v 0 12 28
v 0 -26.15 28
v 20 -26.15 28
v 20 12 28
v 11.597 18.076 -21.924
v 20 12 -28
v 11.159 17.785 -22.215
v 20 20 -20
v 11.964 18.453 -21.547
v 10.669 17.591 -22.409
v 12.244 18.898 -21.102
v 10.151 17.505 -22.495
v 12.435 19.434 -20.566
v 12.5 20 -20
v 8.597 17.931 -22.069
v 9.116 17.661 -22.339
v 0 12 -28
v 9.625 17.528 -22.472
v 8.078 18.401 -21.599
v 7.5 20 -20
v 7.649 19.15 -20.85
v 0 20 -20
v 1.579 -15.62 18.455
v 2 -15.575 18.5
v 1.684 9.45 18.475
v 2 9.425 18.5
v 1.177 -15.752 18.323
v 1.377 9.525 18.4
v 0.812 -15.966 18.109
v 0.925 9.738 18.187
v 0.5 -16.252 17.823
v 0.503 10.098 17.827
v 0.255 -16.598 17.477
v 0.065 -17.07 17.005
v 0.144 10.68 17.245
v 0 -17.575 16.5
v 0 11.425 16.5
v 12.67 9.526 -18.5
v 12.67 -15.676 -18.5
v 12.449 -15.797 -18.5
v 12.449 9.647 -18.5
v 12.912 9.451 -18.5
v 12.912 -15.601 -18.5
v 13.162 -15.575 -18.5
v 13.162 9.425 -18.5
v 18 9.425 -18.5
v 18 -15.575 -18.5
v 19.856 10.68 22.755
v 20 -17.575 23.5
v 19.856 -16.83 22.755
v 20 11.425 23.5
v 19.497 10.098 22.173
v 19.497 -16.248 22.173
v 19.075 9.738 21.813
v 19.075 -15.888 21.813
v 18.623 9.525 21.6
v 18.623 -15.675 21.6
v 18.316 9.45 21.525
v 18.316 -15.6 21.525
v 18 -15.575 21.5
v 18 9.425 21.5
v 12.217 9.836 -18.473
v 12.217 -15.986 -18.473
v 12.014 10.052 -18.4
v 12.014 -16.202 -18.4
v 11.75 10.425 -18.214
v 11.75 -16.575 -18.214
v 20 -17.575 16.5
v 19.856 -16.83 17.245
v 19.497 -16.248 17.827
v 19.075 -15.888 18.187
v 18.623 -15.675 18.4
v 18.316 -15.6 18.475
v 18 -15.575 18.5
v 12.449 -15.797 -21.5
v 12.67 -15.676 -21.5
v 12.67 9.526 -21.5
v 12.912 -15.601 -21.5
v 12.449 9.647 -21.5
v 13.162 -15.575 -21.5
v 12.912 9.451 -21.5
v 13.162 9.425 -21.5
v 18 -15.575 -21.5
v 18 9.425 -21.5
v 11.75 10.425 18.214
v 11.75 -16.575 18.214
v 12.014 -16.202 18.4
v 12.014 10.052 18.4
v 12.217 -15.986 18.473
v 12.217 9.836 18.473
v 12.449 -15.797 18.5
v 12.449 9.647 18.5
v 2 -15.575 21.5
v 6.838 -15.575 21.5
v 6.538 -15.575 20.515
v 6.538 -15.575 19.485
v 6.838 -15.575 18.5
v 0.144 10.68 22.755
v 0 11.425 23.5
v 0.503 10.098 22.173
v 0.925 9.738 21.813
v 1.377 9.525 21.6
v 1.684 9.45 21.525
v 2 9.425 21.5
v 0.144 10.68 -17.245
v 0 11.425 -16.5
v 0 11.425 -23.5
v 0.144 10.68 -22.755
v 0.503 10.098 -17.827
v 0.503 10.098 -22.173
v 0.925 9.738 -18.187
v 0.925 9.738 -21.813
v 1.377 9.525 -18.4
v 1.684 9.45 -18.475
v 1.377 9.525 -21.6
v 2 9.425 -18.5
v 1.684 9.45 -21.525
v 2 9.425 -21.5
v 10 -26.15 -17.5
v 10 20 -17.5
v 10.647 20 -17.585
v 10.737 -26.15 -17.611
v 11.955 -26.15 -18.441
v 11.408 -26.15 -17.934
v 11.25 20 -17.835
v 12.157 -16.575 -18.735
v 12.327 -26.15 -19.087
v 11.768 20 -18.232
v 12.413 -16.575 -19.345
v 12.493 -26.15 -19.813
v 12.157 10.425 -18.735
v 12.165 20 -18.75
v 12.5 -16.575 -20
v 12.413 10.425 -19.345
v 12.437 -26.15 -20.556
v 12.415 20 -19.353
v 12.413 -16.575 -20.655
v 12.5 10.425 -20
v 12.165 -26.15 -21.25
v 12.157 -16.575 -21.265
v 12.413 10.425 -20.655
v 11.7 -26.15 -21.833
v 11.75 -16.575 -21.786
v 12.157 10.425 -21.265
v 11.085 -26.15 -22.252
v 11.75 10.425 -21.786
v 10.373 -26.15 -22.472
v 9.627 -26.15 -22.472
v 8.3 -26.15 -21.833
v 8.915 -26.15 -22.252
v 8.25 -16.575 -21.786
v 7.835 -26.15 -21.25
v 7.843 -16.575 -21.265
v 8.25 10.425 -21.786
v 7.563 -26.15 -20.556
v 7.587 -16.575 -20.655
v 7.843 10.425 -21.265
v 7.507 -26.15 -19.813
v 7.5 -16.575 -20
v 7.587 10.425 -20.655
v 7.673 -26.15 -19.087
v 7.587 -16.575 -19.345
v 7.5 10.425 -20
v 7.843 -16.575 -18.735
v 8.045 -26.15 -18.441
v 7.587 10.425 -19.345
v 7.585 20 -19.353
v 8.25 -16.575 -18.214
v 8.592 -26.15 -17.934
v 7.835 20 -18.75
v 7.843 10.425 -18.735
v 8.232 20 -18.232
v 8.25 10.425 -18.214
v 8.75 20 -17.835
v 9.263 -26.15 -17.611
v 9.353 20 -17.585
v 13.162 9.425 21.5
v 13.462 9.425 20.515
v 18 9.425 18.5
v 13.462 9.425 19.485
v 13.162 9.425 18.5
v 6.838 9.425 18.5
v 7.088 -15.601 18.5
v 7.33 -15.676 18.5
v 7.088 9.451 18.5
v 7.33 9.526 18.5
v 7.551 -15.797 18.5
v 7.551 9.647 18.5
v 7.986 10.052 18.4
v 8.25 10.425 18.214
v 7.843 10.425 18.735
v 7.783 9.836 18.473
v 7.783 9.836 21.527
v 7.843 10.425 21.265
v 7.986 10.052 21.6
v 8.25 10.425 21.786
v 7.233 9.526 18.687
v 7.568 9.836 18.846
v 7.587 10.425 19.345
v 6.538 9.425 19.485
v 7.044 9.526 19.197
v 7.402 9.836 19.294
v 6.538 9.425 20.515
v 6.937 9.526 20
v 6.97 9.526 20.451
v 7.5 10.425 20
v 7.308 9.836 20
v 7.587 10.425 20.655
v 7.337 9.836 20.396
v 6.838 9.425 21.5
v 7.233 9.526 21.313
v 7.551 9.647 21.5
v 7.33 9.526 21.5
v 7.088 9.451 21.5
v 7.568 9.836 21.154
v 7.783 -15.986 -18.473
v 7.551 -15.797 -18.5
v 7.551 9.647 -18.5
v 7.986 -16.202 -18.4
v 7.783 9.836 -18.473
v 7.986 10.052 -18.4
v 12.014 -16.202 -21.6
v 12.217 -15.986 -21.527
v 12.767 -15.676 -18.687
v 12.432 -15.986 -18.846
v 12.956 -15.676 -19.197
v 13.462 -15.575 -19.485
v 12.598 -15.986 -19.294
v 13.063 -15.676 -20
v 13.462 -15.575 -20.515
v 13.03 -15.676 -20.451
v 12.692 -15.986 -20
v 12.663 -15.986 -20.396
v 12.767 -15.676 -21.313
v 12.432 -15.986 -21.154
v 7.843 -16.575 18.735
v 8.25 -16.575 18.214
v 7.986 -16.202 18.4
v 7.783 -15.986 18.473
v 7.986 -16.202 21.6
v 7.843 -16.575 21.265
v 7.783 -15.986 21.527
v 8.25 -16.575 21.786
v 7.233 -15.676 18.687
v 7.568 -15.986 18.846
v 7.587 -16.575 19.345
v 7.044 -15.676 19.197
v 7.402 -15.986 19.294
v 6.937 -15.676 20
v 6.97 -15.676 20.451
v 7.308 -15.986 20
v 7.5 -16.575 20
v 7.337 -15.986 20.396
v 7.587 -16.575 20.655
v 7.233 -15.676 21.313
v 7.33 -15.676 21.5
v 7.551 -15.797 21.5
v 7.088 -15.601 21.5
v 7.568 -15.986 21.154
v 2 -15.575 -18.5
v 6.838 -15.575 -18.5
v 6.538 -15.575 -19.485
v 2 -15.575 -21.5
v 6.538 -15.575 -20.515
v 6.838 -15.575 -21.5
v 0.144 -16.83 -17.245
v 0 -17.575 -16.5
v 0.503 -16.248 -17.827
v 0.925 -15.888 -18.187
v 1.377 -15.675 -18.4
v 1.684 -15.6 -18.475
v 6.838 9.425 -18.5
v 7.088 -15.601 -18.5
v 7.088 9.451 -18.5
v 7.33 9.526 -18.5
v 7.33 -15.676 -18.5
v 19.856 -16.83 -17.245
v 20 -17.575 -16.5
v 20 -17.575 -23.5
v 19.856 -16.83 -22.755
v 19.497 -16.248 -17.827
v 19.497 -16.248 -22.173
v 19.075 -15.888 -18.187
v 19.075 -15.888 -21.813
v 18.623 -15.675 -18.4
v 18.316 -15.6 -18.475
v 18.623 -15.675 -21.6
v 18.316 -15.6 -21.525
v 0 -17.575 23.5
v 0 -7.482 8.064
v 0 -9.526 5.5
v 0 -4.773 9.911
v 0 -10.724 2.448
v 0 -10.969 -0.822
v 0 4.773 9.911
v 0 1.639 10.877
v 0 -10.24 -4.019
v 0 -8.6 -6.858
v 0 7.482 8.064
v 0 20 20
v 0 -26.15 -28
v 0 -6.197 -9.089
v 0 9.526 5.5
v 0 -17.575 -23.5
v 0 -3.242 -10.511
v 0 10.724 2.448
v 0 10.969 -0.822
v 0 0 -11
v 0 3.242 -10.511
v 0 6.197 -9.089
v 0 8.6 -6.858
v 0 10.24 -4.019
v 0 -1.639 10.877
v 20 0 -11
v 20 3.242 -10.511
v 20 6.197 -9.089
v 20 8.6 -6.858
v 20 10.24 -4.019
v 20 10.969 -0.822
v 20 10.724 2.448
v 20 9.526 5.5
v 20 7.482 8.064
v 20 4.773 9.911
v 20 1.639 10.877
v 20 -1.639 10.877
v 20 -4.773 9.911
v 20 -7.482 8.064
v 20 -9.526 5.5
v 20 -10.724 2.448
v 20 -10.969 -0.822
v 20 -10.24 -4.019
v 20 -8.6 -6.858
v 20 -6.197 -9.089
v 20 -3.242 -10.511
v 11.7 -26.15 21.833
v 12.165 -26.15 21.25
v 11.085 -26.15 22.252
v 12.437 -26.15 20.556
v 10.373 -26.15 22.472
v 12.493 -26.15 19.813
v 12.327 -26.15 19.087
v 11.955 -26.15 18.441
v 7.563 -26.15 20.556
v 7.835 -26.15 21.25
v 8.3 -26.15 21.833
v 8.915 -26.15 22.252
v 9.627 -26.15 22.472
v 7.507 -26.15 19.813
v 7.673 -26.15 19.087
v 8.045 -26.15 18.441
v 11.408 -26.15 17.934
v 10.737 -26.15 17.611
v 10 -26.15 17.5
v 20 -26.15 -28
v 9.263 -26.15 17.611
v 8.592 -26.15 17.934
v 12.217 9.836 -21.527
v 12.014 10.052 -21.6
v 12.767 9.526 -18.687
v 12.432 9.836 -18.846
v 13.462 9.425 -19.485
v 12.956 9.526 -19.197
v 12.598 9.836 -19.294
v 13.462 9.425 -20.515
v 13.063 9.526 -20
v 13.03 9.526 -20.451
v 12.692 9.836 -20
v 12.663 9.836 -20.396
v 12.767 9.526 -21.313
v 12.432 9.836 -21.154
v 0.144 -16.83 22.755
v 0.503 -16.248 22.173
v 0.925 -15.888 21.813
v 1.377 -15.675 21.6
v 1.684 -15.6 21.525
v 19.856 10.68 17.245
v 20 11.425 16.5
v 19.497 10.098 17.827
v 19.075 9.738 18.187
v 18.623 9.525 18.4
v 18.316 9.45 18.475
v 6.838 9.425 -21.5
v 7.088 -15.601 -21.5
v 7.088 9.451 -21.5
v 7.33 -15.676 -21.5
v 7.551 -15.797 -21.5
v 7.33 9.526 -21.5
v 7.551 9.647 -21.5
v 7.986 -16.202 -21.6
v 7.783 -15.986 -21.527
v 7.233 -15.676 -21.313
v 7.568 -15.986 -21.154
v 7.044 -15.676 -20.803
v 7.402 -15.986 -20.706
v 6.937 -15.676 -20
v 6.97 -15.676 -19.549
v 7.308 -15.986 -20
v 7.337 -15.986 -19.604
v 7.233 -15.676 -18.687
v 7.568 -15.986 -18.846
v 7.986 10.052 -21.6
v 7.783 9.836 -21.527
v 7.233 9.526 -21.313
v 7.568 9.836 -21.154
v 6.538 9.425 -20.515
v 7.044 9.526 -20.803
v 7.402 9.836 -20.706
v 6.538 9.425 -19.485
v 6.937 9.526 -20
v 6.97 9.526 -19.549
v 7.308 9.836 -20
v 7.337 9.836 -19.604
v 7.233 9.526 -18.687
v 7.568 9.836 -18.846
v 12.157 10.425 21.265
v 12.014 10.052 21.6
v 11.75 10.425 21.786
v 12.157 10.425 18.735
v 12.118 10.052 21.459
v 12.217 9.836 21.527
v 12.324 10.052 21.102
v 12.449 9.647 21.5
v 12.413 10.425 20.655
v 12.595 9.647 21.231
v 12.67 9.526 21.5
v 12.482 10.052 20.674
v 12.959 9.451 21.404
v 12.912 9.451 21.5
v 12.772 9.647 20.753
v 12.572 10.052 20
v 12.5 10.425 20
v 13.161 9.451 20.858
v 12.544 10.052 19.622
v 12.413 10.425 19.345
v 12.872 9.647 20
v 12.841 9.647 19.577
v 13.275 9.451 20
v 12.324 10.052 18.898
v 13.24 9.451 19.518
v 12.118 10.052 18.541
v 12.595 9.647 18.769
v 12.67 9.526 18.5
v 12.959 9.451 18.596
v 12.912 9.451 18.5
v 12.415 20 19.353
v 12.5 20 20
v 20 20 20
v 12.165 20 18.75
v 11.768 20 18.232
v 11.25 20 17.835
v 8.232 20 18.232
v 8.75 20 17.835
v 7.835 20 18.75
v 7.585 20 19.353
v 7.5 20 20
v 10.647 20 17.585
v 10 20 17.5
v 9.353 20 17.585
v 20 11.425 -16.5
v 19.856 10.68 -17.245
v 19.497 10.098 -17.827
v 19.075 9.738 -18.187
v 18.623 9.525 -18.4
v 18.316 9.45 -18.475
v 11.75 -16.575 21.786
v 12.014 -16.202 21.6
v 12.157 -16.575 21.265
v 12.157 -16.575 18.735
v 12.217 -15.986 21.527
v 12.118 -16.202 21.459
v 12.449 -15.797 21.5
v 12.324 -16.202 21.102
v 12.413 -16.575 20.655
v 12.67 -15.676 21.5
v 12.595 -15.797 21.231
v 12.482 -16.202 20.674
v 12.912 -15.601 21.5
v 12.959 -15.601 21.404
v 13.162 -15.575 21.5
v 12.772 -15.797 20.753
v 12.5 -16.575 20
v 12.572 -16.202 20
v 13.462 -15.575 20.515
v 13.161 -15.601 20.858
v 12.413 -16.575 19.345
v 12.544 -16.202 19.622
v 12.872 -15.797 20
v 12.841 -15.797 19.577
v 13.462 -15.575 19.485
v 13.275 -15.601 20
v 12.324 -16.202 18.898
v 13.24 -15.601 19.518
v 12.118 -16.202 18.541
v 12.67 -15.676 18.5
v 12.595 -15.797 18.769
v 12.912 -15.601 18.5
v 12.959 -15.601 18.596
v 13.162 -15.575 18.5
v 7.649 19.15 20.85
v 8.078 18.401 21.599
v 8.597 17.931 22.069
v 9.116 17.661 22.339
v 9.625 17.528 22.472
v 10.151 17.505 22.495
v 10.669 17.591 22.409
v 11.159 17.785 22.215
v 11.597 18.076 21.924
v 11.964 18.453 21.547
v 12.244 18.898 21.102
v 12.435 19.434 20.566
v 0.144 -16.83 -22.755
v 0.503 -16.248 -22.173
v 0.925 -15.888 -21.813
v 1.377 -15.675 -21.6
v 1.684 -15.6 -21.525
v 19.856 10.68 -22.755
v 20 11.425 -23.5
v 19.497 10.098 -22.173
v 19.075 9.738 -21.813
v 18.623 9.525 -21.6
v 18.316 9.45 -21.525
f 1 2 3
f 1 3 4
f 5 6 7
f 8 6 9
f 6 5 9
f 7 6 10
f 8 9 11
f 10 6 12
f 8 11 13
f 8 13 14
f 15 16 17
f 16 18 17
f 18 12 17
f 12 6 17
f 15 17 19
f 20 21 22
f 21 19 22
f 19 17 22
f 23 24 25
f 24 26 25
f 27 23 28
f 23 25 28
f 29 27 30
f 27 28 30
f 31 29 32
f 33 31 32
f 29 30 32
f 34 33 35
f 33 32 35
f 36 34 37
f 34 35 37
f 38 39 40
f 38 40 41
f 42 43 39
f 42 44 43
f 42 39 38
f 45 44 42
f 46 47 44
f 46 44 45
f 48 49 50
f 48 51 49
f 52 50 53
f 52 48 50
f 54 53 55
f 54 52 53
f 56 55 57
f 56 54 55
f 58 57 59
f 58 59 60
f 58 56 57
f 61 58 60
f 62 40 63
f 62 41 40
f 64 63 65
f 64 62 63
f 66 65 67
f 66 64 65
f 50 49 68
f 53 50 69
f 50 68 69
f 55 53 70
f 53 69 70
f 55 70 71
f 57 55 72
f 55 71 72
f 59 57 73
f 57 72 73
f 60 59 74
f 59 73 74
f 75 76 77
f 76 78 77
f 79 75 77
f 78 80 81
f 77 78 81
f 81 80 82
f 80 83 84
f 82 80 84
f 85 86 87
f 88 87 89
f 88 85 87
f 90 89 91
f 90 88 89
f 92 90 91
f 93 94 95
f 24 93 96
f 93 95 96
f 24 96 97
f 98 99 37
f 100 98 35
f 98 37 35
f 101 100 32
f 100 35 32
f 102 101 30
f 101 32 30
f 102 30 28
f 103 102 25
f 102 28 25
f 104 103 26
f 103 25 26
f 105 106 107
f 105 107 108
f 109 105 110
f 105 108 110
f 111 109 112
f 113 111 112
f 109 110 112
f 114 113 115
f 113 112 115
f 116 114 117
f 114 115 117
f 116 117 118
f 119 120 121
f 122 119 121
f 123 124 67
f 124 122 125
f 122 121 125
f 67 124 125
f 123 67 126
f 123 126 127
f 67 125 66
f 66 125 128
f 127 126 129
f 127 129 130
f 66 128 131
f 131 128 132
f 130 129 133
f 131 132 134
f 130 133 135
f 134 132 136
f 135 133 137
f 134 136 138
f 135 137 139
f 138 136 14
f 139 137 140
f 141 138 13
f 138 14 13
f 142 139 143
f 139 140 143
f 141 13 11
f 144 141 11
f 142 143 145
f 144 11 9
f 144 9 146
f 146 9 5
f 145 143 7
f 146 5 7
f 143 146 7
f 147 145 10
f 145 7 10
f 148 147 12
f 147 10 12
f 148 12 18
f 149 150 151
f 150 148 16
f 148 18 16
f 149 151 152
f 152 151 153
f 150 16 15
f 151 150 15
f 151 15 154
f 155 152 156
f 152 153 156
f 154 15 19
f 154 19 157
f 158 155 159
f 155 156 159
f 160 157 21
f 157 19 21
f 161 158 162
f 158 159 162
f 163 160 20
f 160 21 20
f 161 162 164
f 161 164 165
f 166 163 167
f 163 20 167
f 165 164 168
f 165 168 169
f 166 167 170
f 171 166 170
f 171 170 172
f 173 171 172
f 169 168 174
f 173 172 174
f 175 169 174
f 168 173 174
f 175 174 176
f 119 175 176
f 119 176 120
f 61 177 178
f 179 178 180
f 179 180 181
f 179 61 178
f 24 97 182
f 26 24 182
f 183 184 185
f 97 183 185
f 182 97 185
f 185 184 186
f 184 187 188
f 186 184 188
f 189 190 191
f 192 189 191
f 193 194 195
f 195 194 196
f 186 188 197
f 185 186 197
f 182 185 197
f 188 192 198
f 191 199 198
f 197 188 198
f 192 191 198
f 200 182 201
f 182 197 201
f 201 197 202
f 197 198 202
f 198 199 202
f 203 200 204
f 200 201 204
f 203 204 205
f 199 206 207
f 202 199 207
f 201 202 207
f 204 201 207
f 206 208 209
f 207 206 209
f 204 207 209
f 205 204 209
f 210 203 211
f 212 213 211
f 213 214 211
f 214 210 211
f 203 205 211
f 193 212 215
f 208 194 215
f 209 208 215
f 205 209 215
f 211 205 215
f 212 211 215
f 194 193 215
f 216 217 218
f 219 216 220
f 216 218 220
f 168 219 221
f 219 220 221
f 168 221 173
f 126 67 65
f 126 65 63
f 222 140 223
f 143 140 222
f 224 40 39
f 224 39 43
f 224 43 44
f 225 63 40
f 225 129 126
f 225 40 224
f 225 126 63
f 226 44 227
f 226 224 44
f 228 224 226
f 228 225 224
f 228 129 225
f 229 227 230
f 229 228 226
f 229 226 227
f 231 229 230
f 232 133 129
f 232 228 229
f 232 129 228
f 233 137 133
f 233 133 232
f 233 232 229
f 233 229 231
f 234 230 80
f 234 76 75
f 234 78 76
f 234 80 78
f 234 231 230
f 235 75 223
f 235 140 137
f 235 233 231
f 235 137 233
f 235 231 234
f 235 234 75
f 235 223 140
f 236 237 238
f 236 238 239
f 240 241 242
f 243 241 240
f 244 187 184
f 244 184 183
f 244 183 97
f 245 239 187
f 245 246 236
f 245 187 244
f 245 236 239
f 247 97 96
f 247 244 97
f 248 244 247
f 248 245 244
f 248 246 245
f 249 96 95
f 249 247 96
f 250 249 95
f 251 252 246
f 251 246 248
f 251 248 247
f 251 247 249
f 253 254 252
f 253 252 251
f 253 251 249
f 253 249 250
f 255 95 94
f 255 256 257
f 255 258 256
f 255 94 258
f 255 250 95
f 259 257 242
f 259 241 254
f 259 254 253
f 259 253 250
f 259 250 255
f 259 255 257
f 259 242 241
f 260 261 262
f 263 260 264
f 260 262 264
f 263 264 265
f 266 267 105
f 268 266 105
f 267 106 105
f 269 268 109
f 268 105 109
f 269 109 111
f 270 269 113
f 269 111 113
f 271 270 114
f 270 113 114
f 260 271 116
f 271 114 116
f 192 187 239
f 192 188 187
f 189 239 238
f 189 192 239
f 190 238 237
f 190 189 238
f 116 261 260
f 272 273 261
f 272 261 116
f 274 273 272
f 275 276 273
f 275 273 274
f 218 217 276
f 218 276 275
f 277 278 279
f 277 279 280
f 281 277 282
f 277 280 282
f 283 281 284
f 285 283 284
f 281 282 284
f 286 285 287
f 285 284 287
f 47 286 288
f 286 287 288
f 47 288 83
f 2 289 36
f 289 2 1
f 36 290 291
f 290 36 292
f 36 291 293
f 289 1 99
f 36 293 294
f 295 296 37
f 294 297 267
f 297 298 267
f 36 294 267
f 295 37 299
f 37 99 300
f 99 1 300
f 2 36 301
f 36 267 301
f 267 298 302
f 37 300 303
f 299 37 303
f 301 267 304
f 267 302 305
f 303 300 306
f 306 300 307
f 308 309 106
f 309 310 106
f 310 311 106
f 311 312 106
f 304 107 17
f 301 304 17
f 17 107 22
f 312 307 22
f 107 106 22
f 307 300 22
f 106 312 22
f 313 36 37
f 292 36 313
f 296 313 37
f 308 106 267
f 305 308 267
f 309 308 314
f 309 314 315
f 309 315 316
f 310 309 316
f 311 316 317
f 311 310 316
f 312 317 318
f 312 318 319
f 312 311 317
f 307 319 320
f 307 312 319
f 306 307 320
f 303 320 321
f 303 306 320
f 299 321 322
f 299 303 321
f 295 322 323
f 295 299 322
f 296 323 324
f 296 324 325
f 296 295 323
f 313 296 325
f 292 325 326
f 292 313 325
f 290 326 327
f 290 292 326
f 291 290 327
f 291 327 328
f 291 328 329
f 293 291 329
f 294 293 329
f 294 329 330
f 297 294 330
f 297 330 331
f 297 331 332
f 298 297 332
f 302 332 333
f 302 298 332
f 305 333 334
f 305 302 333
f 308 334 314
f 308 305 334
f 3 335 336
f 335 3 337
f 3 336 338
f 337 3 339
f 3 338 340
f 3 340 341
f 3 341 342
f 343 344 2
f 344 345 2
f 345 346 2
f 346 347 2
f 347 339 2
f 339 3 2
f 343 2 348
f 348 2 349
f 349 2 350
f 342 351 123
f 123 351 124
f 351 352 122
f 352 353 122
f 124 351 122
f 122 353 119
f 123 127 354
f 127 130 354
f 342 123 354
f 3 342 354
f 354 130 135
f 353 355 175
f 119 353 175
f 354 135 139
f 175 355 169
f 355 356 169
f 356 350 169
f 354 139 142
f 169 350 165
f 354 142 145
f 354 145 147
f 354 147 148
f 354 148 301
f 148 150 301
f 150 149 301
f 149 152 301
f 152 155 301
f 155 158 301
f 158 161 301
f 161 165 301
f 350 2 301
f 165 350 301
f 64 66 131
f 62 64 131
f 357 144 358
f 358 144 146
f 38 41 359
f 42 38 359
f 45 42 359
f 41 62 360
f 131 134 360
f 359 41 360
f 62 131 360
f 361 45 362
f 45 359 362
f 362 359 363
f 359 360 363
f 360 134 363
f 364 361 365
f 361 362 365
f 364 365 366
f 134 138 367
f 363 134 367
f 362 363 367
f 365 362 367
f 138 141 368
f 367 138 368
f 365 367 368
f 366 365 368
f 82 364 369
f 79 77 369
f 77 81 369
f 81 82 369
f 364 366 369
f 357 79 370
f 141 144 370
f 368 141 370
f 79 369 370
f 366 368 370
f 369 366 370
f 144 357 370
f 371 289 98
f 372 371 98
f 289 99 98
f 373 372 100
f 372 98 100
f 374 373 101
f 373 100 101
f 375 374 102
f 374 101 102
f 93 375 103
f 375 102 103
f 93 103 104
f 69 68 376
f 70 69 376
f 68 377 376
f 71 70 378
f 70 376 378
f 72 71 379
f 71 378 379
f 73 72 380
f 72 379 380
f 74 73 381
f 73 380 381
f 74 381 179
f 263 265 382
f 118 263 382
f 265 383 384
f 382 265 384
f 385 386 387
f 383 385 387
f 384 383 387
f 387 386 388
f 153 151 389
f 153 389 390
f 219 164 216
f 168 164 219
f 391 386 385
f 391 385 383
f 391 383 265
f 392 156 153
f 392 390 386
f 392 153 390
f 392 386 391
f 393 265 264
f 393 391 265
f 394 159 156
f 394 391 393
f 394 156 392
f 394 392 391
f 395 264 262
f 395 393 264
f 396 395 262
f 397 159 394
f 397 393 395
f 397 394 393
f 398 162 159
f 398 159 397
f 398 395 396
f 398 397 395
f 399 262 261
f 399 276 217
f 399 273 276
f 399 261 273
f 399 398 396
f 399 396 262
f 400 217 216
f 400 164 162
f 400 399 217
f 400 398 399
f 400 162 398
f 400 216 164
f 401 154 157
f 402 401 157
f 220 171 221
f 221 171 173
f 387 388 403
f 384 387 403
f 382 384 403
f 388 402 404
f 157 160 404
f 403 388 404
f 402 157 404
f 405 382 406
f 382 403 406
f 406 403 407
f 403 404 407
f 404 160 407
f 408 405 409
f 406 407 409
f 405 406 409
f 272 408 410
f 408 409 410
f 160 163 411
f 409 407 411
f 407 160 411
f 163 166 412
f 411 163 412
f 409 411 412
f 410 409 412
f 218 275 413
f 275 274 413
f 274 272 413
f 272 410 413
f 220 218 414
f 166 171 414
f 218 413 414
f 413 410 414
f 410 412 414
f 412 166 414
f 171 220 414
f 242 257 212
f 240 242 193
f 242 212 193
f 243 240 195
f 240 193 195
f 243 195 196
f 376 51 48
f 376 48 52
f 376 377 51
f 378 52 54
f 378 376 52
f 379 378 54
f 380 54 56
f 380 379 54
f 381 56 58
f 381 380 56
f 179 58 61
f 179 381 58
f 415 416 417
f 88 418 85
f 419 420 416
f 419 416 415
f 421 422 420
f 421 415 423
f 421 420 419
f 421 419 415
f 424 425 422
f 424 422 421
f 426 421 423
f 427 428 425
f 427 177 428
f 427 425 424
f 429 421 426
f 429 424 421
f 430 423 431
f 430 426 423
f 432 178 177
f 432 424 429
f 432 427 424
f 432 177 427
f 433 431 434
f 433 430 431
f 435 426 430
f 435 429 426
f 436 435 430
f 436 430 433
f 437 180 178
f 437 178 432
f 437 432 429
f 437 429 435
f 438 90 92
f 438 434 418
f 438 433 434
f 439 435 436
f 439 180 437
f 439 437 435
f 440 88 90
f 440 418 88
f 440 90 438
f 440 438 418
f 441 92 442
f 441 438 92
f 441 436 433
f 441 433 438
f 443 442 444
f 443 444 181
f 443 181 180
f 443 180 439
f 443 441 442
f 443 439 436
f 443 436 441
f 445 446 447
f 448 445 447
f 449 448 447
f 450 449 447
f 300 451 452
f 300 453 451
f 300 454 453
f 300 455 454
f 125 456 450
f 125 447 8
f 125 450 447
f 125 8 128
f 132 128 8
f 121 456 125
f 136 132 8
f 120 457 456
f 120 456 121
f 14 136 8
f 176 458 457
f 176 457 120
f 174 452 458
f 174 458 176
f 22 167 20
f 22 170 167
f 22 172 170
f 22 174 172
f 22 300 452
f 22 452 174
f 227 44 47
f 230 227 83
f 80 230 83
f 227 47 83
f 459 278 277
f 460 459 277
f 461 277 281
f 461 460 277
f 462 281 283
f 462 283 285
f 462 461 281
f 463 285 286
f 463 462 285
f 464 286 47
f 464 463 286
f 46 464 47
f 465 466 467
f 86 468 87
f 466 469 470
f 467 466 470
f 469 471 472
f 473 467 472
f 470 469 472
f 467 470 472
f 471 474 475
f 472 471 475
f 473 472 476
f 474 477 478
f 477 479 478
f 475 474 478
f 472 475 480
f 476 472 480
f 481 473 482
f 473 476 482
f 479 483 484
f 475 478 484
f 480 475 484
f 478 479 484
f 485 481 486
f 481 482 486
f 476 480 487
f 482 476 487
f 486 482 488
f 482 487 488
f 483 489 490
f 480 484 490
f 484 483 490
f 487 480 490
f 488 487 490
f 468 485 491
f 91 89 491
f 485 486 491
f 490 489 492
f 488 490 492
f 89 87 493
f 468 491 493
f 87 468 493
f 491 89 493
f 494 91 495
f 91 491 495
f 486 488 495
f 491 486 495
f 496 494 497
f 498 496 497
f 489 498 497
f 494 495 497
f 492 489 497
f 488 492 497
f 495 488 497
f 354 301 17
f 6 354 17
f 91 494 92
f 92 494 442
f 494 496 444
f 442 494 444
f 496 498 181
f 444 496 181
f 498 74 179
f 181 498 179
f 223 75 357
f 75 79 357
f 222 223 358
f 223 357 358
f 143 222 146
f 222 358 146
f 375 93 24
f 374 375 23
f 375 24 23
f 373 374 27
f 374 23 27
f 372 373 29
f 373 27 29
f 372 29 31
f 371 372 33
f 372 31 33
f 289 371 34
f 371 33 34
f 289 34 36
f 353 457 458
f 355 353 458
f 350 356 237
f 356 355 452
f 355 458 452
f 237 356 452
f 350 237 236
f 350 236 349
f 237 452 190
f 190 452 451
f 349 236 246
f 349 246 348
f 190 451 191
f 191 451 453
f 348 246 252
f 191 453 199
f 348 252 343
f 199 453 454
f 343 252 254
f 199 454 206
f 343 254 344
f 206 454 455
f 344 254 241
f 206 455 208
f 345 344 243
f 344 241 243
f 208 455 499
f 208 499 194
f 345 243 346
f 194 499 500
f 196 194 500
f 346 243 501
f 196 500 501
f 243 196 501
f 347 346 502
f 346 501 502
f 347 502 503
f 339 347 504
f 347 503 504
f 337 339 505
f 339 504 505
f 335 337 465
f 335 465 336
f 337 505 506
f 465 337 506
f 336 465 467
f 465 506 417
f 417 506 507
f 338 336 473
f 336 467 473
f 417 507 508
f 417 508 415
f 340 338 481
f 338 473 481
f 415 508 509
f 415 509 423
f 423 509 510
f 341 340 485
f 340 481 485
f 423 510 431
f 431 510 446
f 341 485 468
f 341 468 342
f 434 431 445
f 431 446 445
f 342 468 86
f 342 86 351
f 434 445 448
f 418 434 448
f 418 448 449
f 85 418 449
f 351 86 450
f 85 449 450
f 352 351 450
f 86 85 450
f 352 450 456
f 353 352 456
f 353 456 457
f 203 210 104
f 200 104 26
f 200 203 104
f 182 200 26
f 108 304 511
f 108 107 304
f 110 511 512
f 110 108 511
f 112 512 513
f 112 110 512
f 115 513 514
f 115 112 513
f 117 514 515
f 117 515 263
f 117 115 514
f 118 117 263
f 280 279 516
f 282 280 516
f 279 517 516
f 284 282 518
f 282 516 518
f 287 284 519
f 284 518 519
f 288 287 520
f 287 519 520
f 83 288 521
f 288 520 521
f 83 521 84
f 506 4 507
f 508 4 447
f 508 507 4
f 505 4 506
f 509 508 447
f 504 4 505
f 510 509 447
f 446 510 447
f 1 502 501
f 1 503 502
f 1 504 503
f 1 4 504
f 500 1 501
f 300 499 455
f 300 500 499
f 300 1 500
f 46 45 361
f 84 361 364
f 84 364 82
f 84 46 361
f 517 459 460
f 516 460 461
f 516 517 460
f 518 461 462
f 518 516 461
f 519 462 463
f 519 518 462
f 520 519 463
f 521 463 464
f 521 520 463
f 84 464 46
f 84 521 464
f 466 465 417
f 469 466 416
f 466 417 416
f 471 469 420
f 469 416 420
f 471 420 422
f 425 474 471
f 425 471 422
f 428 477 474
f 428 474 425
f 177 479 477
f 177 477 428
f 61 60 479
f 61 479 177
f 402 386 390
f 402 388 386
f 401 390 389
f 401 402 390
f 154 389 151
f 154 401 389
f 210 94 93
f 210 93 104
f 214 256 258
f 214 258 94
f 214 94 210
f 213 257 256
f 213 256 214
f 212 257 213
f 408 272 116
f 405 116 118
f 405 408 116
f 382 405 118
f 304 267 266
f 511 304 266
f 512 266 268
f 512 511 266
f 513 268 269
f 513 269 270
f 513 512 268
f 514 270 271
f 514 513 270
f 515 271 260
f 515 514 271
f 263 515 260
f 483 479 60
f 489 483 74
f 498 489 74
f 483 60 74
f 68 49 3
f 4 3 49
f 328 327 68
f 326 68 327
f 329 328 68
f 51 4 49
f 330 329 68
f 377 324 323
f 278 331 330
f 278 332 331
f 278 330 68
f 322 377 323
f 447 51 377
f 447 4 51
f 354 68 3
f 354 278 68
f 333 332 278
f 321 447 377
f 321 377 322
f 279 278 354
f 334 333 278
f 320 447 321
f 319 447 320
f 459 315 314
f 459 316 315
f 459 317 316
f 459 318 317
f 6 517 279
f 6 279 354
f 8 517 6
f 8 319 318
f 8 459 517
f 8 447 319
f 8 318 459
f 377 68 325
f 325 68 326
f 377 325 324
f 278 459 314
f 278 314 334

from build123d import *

# Parameters (mm, degrees)
SKETCH_2_W          = 56
SKETCH_2_H          = 46.15
SKETCH_2_R          = 11
EXTRUDE_1_DEPTH     = 20
SKETCH_3_R          = 2.5
CUT_EXTRUDE_1_DEPTH = 58.565810165
SKETCH_4_W          = 3
SKETCH_4_H          = 25
CUT_EXTRUDE_2_DEPTH = 44.218312091
CHAMFER_1_SIZE      = 8
FILLET_1_R          = 1
FILLET_2_R          = 2


with BuildPart() as part:
    # 스케치2 → 보스-돌출1 (new body)
    with BuildSketch(Plane(origin=(0, 0, 0), x_dir=(0, 0, -1), z_dir=(1, 0, 0))):
        with Locations((0, -3.075)):
            Rectangle(SKETCH_2_W, SKETCH_2_H)
        Circle(SKETCH_2_R, mode=Mode.SUBTRACT)
    extrude(amount=EXTRUDE_1_DEPTH)

    # 스케치3 → 컷-돌출1 (cut, through all)
    with BuildSketch(Plane(origin=(0, 20, 0), x_dir=(1, 0, 0), z_dir=(0, 1, 0))):
        with Locations(Location((10, 20, 0), (0, 0, 270))):
            Circle(SKETCH_3_R)
        with Locations(Location((10, -20, 0), (0, 0, 90))):
            Circle(SKETCH_3_R)
    extrude(amount=-CUT_EXTRUDE_1_DEPTH, mode=Mode.SUBTRACT)

    # 스케치4 → 컷-돌출2 (cut, through all)
    with BuildSketch(Plane(origin=(20, 0, 0), x_dir=(0, 0, -1), z_dir=(1, 0, 0))):
        with Locations((-20, -3.075)):
            Rectangle(SKETCH_4_W, SKETCH_4_H)
        with Locations((20, -3.075)):
            Rectangle(SKETCH_4_W, SKETCH_4_H)
    extrude(amount=-CUT_EXTRUDE_2_DEPTH, mode=Mode.SUBTRACT)

    # 모따기1
    # the kernel refuses this chamfer: 8 mm, written as the material it takes off along each edge
    with BuildSketch(Plane(origin=(-20.573463904, 20, 28), x_dir=(0, -0.9996219169112968, 0.027495876610586494), z_dir=(1, 0, 0))) as chamfer_1_piece_1:
        Polygon((CHAMFER_1_SIZE * 0.999621916911, CHAMFER_1_SIZE * 0.0274958766106), (-CHAMFER_1_SIZE * 0.0274958766106, CHAMFER_1_SIZE * 0.999621916911), (0, 0), align=None)
    extrude(amount=61.146927807, mode=Mode.SUBTRACT)
    with BuildSketch(Plane(origin=(-20.573463904, 20, -28), x_dir=(0, -0.9996219169112968, -0.027495876610586494), z_dir=(1, 0, 0))) as chamfer_1_piece_2:
        Polygon((CHAMFER_1_SIZE * 0.999621916911, -CHAMFER_1_SIZE * 0.0274958766106), (-CHAMFER_1_SIZE * 0.0274958766106, -CHAMFER_1_SIZE * 0.999621916911), (0, 0), align=None)
    extrude(amount=61.146927807, mode=Mode.SUBTRACT)

    # 필렛1
    fillet_1_edges = [part.edges().sort_by_distance(p)[0] for p in [
        (12.5, 9.425, -20),
        (12, -3.075, -18.5),
        (12.5, -15.575, -20),
        (12, -3.075, -21.5),
        (7.5, 9.425, -20),
        (8, -3.075, -18.5),
        (7.5, -15.575, -20),
        (8, -3.075, -21.5),
        (12.5, -15.575, 20),
        (12, -3.075, 18.5),
        (12.5, 9.425, 20),
        (12, -3.075, 21.5),
        (7.5, -15.575, 20),
        (8, -3.075, 18.5),
        (7.5, 9.425, 20),
        (8, -3.075, 21.5),
    ]]
    fillet(fillet_1_edges, radius=FILLET_1_R)

    # 필렛2
    fillet_2_edges = [part.edges().sort_by_distance(p)[0] for p in [
        (0, -3.075, 21.5),
        (0, 9.425, 20),
        (0, -3.075, 18.5),
        (0, -15.575, 20),
        (20, -3.075, 21.5),
        (20, -15.575, 20),
        (20, -3.075, 18.5),
        (20, 9.425, 20),
        (0, -3.075, -21.5),
        (0, -15.575, -20),
        (0, -3.075, -18.5),
        (0, 9.425, -20),
        (20, -3.075, -21.5),
        (20, 9.425, -20),
        (20, -3.075, -18.5),
        (20, -15.575, -20),
    ]]
    fillet(fillet_2_edges, radius=FILLET_2_R)


solid = part.part
